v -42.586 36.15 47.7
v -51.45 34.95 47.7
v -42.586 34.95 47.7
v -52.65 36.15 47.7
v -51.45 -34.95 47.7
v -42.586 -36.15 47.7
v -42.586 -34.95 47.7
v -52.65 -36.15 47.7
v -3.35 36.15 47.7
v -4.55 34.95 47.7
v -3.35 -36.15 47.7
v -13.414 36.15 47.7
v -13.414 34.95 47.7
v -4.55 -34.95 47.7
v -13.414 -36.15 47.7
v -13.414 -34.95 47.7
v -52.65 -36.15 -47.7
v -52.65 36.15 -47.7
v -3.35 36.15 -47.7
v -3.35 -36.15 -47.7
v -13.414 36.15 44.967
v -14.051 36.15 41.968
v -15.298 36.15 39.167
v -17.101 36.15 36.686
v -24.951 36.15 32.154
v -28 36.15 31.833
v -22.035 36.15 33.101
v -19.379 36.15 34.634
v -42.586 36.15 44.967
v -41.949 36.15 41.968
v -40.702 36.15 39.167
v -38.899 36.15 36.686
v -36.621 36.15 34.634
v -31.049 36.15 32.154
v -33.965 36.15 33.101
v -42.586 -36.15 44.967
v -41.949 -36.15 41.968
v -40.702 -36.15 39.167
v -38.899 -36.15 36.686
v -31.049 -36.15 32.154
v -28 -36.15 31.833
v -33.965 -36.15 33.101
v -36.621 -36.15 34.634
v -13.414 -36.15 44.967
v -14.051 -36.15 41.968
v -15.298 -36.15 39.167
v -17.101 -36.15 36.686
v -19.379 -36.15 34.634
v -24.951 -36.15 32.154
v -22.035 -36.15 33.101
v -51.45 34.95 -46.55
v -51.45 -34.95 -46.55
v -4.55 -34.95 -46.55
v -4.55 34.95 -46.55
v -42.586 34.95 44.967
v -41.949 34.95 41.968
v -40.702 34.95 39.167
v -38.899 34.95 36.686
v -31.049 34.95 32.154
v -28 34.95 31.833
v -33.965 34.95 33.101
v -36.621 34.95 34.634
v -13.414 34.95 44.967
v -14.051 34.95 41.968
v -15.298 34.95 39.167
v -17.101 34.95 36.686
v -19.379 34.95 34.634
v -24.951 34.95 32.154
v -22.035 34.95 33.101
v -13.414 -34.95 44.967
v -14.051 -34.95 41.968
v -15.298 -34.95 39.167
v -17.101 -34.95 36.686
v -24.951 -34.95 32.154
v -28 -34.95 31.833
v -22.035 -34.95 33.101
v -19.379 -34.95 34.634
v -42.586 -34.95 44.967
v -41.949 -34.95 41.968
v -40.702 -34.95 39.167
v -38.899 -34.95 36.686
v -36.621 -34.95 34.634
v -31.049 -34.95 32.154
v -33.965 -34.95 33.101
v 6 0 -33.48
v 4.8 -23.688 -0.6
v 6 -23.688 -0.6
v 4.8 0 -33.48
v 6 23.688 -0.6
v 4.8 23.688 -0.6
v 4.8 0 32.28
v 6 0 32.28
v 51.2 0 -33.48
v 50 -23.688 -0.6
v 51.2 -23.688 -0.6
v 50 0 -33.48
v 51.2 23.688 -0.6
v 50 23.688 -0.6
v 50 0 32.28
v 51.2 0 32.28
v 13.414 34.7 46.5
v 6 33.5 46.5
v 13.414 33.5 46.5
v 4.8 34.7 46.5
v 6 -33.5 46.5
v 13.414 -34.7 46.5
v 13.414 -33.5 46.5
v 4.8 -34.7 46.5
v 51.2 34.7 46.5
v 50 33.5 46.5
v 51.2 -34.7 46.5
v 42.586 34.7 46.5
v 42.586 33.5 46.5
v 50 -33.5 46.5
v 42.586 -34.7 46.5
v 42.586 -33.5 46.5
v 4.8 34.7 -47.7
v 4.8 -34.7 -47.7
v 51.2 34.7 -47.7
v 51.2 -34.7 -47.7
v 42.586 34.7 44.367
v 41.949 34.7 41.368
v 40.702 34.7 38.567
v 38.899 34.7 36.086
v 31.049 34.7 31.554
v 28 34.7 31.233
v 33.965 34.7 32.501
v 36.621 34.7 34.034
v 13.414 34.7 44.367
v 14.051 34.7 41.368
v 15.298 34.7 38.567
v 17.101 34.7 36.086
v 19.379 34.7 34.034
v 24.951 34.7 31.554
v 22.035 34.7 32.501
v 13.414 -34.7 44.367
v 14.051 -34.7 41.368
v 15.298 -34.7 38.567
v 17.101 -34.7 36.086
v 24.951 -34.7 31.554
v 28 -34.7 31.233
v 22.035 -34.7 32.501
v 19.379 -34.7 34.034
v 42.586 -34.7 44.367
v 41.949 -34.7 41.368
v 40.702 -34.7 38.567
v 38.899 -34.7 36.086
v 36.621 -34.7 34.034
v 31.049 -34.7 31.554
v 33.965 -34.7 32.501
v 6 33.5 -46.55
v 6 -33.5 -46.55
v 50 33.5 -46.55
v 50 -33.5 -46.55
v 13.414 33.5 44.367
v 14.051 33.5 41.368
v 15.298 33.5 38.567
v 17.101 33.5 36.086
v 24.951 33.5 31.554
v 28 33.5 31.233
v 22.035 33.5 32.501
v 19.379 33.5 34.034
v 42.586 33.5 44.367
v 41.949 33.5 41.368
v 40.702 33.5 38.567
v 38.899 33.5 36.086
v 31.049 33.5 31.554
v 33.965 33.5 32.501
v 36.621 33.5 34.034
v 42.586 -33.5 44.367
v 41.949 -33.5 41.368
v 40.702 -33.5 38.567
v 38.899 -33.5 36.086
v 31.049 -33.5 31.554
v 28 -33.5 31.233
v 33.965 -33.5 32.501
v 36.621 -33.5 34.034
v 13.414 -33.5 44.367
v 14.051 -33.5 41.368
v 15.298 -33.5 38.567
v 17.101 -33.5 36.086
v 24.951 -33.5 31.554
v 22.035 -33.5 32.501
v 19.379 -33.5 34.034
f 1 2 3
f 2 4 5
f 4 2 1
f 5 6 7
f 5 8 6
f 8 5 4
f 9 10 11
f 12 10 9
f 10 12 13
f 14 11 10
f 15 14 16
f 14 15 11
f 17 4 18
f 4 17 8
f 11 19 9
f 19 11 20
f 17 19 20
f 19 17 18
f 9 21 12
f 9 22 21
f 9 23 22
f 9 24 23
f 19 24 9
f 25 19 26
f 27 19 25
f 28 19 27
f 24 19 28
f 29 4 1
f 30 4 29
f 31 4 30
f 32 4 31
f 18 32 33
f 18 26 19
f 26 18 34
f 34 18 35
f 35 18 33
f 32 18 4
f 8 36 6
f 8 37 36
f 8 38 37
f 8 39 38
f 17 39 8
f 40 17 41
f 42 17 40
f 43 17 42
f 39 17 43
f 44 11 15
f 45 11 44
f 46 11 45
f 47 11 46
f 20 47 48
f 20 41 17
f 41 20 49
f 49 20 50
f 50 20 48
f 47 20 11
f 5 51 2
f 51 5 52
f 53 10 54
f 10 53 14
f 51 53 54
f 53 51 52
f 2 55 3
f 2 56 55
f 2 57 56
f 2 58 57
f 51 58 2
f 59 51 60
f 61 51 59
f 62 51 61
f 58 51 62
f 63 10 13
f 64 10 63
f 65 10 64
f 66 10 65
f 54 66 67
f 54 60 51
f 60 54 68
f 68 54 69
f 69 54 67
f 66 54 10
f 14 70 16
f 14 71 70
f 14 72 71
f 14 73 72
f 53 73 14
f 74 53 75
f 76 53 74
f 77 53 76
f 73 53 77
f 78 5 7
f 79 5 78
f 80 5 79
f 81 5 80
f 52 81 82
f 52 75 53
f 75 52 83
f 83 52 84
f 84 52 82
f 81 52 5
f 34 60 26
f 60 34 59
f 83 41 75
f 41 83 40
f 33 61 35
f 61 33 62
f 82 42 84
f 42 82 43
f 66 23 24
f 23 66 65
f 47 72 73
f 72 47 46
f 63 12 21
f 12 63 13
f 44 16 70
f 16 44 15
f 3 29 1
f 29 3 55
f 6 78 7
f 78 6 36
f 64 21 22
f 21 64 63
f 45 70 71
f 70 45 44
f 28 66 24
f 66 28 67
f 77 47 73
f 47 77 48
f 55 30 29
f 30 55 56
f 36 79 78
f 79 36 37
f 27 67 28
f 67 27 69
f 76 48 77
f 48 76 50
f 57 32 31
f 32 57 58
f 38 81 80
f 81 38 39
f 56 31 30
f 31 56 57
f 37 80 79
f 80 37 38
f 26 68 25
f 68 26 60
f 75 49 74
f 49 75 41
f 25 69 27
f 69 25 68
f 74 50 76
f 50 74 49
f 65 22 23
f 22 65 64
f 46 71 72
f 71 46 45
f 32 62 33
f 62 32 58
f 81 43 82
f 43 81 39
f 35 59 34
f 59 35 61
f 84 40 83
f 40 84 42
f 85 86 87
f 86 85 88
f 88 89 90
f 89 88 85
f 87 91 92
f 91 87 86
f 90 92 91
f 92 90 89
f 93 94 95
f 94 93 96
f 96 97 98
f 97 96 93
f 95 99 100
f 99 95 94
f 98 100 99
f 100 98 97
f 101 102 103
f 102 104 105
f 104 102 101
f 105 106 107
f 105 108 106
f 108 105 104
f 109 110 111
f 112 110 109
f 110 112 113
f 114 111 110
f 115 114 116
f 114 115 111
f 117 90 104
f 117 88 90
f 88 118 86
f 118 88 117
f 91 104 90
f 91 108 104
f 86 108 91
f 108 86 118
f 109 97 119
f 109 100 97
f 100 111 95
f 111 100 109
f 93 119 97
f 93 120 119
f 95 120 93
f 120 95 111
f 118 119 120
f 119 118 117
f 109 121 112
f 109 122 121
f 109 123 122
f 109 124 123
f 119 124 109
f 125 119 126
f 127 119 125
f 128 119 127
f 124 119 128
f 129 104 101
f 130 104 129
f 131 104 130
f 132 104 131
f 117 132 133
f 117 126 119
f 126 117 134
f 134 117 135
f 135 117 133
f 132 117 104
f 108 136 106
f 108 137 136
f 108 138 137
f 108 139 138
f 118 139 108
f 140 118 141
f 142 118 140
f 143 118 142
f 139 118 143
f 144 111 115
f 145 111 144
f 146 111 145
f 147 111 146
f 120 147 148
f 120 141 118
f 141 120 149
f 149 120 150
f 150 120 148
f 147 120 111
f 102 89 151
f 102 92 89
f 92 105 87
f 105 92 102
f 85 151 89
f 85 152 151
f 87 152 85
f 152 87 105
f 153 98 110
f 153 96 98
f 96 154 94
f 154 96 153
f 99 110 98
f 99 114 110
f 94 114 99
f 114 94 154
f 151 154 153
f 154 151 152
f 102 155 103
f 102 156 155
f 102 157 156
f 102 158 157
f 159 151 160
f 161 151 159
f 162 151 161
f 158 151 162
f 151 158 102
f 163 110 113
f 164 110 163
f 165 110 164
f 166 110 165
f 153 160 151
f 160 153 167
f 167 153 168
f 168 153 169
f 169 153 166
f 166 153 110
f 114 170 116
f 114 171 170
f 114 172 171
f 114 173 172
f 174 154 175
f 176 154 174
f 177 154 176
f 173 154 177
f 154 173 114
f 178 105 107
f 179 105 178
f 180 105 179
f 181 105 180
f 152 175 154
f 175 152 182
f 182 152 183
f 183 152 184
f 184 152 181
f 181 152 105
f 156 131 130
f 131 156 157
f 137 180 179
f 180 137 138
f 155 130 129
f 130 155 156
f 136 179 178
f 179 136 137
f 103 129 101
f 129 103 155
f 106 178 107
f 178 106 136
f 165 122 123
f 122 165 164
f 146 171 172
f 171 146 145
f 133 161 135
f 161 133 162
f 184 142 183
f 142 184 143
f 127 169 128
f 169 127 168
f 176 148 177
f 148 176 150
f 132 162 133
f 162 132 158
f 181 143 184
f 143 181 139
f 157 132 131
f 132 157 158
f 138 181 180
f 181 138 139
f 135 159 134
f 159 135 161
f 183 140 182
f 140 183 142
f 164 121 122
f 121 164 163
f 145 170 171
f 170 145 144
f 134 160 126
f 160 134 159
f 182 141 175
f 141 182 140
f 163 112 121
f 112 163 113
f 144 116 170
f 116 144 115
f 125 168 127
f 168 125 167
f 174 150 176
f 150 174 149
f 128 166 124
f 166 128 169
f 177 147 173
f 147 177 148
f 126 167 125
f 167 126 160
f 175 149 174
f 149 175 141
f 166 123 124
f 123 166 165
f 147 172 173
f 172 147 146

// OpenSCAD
// export each separately
// box_lid(_h,_w,_d);
// box_lower(_h,_w,_d, _hasCutout);

// define card size
// Ex: MTG with sleeves 93, 67, 44
// height in mm
_h = 93;  
// width in mm
_w = 67;   
// depth/how thick is the pile of cards in mm
_d = 44 ;
// should the bottom have a cutout?
_hasCutout = 1;  // [1:yes,0:no] 
// should this thing render the top/lid of the box
_include_top = 1;  // [1:yes,0:no]
// should this thing render the bottom of the box
_include_bottom = 1;  // [1:yes,0:no]
// when rendering both top and bottom, include spacing between objects (in mm).
_object_spacing = 4;  


// cut out will save on printing material and time

//     _________________
//    /                /|
//   /                d |
//  /                /  |
// ------------------   |
// |                |   |
// |                |   |
// |                |   |
// |                h   |
// |                |   |
// |                |   |
// |                |  /
// |                | /
// |                |/
// ---------w--------




module inner_dim(h,w,d)
{
	translate([.6,0,0]) cube([h + 0.1,w,d],center=true);
	
}

module outer_dim(h,w,d)
{
	cube([h + 1.2,w + 2.4,d + 2.4],center=true);

}
module outer_lid(h,w,d)
{
	h_mod = h;
	w_mod = w + 0.5;
	d_mod = d + 0.5;
	cube([h_mod + 2.4, w_mod + 4.8,d_mod + 4.8],center=true);
	
}


module cutout(h,w,d)
{
	scale([(h/2),(w/2),1]) rotate([0,0,45]) cube([1,1,5], center=true);

}

module box_lower(h,w,d,hasCutout)
{
	difference()
	{
		outer_dim(h,w,d);
		inner_dim(h,w,d);
		translate([h/2,0,0]) 
			rotate([90,0,0]) 
				cylinder(w+40, d=d/1.5, center=true);
		
		if(hasCutout)
		{
			translate([0,0,d/2]) cutout(h,w,d);
			translate([0,0,-d/2]) cutout(h,w,d);
		}
	}

}

module box_lid(h,w,d)
{
	difference()
	{
		outer_lid(h,w,d);
		translate([.6,0,0]) outer_dim(h + .1,w+.5,d + .5);
		translate([h/2,0,0]) 
			rotate([90,0,0]) 
				cylinder(w+40, d=d/1.5, center=true);
	}
	
}

// control output for customizer
module output_top()
{
    rotate([0,-90,0]) box_lid(_h,_w,_d);
}

module output_bottom()
{
    translate([0,0,-(1.2/2)]) rotate([0,-90,0]) box_lower(_h,_w,_d, _hasCutout);
}

if(_include_top == 1 && _include_bottom == 1)
{
    translate([-(_d/2) - 2 - _object_spacing,0,0]) output_top();
    translate([(_d/2) + 2 + _object_spacing,0,0]) output_bottom();
}
else if(_include_top == 1)
{
    output_top();
}
else
{
    output_bottom(); 
}


//output_top();

//translate([30,0,0]) rotate([0,-90,0]) box_lid(_h,_w,_d);
//translate([-30,0,0])  rotate([0,-90,0]) box_lower(_h,_w,_d, _hasCutout);
